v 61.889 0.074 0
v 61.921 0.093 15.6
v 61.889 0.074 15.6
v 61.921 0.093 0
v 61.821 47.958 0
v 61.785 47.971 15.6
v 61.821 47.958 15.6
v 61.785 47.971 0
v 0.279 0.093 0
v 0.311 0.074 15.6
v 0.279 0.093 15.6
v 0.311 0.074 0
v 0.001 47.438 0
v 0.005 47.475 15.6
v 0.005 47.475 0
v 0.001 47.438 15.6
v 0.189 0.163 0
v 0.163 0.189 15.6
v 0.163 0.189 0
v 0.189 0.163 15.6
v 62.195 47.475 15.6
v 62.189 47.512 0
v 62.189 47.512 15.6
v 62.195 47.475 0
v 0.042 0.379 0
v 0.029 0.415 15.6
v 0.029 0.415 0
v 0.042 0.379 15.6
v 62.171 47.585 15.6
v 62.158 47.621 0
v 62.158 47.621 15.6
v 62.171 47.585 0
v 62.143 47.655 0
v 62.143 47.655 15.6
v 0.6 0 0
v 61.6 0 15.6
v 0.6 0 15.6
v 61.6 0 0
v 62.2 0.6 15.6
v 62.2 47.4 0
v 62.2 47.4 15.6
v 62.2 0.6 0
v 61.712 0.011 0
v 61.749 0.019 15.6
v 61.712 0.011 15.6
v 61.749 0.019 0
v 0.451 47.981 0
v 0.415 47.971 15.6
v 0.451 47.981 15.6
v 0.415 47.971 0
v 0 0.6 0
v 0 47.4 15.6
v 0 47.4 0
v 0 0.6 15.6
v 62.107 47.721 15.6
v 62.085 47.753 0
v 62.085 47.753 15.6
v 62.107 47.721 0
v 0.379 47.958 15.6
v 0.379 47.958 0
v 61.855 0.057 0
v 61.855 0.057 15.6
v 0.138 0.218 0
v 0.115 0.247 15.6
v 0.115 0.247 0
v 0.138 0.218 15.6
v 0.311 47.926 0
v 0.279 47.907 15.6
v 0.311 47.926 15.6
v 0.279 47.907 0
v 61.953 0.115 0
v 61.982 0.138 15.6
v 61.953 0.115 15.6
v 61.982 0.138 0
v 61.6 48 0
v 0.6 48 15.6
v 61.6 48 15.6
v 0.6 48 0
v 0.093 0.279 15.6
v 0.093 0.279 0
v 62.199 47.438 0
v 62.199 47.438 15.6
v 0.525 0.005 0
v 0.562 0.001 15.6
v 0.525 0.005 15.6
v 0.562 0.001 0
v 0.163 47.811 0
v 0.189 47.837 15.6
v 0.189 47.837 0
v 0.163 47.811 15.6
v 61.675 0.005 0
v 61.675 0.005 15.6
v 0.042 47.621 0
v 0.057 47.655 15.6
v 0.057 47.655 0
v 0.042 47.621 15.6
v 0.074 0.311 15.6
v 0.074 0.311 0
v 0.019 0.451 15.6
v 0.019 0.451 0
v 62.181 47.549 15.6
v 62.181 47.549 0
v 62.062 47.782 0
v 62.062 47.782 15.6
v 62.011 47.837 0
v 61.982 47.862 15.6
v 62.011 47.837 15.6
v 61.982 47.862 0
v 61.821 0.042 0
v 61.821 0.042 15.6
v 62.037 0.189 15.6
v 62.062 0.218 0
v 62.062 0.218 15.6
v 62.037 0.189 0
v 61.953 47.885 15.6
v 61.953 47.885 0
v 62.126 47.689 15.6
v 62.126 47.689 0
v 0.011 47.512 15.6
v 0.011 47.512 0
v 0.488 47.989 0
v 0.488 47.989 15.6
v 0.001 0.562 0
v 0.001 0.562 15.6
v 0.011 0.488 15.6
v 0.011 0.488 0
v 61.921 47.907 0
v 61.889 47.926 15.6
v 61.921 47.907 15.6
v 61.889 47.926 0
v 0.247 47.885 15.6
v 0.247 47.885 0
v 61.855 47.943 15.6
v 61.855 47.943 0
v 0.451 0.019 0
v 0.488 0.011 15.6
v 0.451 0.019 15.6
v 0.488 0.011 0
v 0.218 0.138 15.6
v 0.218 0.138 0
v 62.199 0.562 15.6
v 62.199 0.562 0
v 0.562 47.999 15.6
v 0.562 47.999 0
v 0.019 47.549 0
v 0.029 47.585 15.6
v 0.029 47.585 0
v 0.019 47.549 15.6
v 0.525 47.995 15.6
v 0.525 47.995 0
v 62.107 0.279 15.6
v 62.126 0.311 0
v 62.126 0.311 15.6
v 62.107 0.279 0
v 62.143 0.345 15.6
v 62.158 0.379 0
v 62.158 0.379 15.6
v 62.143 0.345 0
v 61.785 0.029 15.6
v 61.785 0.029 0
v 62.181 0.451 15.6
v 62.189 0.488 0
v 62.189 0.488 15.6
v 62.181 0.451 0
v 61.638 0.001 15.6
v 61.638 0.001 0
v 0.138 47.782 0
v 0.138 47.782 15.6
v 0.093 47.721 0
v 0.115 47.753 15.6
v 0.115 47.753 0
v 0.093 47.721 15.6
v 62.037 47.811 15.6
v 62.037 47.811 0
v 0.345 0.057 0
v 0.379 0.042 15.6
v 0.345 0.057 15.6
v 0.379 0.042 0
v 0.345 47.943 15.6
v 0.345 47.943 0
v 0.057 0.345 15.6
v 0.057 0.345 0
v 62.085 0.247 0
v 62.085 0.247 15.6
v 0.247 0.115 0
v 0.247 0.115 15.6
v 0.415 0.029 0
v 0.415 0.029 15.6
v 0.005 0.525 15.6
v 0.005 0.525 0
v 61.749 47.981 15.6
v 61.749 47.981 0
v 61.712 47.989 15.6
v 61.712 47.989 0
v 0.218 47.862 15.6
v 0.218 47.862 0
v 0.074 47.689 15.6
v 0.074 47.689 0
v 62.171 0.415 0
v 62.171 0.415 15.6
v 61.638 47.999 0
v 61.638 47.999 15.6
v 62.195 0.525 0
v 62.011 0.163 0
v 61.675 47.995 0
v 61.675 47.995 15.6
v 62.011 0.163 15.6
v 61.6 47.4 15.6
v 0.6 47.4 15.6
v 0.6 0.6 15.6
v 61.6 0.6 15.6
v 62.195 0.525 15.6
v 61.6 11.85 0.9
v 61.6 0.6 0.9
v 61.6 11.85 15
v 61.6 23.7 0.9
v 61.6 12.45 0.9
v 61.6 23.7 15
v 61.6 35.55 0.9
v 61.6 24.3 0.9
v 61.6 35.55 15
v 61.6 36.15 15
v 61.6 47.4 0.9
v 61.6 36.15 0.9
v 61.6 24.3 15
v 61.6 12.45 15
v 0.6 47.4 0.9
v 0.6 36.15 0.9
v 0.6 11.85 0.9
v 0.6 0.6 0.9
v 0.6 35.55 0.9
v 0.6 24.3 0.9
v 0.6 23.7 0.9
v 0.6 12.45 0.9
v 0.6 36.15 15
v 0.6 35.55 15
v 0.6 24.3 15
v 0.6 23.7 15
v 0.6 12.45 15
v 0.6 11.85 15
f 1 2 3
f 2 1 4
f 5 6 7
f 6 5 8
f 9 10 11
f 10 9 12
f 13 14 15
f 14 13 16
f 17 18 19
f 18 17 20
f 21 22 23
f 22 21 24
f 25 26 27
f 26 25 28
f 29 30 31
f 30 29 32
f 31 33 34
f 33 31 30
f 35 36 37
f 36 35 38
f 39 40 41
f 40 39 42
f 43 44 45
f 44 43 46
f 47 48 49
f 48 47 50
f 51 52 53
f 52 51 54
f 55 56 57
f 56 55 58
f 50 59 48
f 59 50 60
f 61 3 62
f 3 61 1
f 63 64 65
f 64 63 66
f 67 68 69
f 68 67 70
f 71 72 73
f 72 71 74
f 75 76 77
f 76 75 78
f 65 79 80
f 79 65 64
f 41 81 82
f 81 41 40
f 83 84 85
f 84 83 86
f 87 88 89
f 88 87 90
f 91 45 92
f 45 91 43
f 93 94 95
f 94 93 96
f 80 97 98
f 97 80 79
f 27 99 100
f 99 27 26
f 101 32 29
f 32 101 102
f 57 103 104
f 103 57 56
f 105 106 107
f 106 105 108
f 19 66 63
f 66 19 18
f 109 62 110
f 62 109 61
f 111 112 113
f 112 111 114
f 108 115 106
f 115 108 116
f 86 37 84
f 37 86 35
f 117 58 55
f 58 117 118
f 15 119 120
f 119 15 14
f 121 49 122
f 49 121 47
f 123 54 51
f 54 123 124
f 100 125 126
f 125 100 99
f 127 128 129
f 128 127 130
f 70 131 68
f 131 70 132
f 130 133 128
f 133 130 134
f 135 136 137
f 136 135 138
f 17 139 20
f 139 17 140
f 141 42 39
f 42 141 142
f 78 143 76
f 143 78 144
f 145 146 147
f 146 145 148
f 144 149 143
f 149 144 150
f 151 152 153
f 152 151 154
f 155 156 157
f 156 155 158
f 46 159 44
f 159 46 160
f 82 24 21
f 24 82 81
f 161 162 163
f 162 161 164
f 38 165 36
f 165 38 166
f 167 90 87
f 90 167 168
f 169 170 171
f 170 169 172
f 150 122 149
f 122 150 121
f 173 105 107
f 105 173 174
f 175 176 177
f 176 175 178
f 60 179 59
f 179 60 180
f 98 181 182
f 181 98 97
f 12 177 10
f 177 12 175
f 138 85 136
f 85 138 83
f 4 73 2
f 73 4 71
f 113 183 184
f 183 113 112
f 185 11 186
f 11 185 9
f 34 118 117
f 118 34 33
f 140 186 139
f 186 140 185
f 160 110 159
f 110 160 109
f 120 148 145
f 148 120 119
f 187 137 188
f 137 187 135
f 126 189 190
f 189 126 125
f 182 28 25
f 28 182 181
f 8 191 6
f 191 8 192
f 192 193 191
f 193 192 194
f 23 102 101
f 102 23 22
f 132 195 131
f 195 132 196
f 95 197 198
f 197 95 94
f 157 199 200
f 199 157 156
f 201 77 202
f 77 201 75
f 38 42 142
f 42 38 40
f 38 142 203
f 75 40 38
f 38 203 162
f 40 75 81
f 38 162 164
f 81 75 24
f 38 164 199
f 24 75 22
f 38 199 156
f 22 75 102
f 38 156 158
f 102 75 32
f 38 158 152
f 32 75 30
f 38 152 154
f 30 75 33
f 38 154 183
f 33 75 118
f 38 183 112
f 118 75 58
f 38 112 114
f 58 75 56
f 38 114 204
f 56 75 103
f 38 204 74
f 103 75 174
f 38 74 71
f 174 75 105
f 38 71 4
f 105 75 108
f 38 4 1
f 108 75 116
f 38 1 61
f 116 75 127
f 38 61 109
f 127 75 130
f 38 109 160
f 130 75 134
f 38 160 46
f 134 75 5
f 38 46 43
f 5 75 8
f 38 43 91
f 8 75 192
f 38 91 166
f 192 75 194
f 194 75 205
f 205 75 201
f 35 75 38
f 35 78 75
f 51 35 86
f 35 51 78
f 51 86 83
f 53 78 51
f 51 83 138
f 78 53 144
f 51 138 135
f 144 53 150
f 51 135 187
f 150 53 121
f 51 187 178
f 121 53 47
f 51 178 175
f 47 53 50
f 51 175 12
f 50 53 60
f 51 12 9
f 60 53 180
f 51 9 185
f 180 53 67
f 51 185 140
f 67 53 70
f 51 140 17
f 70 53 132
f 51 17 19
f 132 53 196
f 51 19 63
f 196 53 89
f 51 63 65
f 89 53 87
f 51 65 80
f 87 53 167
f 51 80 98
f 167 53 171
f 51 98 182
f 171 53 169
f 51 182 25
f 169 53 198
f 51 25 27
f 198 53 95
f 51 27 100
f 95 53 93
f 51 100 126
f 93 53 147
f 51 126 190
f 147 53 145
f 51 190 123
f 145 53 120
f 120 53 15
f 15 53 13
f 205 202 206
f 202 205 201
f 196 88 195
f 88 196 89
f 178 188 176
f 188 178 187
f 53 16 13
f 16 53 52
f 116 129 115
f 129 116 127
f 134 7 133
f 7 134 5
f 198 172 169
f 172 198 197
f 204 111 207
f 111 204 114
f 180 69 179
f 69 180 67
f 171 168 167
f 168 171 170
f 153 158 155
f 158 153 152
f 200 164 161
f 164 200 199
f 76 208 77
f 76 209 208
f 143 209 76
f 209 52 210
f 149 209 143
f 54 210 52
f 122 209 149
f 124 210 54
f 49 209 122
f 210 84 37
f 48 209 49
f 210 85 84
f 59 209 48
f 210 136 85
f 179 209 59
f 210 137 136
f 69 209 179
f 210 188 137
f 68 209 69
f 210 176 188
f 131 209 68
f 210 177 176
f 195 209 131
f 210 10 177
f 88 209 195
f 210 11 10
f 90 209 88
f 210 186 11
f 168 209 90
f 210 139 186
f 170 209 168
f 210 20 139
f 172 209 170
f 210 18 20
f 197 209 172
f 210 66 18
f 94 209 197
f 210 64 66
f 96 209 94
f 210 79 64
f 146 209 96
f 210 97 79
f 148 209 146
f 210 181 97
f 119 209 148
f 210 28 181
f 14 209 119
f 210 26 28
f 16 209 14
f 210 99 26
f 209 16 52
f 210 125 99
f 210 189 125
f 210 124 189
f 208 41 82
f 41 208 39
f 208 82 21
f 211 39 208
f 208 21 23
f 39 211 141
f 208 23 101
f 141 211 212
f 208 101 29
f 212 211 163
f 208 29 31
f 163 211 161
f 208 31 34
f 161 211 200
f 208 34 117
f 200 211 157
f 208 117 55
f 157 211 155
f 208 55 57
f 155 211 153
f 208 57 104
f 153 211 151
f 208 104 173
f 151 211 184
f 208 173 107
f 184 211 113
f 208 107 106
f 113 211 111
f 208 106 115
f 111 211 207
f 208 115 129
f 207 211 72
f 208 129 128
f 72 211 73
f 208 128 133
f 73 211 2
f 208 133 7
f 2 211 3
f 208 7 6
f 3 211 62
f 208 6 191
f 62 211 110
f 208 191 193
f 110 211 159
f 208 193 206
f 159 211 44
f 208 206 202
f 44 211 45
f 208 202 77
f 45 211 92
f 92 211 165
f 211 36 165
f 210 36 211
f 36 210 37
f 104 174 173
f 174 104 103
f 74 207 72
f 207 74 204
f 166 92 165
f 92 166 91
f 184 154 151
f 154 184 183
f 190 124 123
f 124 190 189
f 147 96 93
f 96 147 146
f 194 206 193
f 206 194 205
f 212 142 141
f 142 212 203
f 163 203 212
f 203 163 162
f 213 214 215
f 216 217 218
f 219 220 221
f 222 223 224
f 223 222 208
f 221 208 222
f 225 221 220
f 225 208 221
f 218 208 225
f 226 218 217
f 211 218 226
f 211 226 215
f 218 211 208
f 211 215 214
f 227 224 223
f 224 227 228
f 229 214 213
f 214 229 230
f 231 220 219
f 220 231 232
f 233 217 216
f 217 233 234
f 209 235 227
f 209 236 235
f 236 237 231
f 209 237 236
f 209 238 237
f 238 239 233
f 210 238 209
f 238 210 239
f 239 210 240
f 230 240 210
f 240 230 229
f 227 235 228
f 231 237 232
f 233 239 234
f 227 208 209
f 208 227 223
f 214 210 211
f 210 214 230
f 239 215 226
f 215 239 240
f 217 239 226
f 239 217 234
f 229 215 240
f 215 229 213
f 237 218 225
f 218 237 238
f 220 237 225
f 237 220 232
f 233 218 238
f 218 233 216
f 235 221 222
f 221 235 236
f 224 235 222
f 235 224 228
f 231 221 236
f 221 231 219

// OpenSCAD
$fn=100; // resolution
frontPlateThickness=0.3;
bottomThickness=0.6;
cylRoundEdgeRadius=0.6;

face_plate_width = 61;
face_plate_height = 46.8;

compartmentWidth = 11.25;
wallThickness = 0.6;

boxDepth = 15;

//color( "yellow", 0.2 )
difference() {
    minkowski() {
        cube([face_plate_width, face_plate_height, boxDepth]);
        translate([cylRoundEdgeRadius,cylRoundEdgeRadius, 0])
        cylinder(r=cylRoundEdgeRadius,h=bottomThickness);
    }
    
    translate([cylRoundEdgeRadius,cylRoundEdgeRadius, 0.9])
    cube([face_plate_width, face_plate_height, boxDepth + 1]);
}

//color( "red", 1.0 )
translate([cylRoundEdgeRadius,compartmentWidth + wallThickness, 0])
cube([face_plate_width, wallThickness, boxDepth]);

translate([cylRoundEdgeRadius,(compartmentWidth + wallThickness) * 2, 0])
cube([face_plate_width, wallThickness, boxDepth]);

translate([cylRoundEdgeRadius,(compartmentWidth + wallThickness) * 3, 0])
cube([face_plate_width, wallThickness, boxDepth]);
